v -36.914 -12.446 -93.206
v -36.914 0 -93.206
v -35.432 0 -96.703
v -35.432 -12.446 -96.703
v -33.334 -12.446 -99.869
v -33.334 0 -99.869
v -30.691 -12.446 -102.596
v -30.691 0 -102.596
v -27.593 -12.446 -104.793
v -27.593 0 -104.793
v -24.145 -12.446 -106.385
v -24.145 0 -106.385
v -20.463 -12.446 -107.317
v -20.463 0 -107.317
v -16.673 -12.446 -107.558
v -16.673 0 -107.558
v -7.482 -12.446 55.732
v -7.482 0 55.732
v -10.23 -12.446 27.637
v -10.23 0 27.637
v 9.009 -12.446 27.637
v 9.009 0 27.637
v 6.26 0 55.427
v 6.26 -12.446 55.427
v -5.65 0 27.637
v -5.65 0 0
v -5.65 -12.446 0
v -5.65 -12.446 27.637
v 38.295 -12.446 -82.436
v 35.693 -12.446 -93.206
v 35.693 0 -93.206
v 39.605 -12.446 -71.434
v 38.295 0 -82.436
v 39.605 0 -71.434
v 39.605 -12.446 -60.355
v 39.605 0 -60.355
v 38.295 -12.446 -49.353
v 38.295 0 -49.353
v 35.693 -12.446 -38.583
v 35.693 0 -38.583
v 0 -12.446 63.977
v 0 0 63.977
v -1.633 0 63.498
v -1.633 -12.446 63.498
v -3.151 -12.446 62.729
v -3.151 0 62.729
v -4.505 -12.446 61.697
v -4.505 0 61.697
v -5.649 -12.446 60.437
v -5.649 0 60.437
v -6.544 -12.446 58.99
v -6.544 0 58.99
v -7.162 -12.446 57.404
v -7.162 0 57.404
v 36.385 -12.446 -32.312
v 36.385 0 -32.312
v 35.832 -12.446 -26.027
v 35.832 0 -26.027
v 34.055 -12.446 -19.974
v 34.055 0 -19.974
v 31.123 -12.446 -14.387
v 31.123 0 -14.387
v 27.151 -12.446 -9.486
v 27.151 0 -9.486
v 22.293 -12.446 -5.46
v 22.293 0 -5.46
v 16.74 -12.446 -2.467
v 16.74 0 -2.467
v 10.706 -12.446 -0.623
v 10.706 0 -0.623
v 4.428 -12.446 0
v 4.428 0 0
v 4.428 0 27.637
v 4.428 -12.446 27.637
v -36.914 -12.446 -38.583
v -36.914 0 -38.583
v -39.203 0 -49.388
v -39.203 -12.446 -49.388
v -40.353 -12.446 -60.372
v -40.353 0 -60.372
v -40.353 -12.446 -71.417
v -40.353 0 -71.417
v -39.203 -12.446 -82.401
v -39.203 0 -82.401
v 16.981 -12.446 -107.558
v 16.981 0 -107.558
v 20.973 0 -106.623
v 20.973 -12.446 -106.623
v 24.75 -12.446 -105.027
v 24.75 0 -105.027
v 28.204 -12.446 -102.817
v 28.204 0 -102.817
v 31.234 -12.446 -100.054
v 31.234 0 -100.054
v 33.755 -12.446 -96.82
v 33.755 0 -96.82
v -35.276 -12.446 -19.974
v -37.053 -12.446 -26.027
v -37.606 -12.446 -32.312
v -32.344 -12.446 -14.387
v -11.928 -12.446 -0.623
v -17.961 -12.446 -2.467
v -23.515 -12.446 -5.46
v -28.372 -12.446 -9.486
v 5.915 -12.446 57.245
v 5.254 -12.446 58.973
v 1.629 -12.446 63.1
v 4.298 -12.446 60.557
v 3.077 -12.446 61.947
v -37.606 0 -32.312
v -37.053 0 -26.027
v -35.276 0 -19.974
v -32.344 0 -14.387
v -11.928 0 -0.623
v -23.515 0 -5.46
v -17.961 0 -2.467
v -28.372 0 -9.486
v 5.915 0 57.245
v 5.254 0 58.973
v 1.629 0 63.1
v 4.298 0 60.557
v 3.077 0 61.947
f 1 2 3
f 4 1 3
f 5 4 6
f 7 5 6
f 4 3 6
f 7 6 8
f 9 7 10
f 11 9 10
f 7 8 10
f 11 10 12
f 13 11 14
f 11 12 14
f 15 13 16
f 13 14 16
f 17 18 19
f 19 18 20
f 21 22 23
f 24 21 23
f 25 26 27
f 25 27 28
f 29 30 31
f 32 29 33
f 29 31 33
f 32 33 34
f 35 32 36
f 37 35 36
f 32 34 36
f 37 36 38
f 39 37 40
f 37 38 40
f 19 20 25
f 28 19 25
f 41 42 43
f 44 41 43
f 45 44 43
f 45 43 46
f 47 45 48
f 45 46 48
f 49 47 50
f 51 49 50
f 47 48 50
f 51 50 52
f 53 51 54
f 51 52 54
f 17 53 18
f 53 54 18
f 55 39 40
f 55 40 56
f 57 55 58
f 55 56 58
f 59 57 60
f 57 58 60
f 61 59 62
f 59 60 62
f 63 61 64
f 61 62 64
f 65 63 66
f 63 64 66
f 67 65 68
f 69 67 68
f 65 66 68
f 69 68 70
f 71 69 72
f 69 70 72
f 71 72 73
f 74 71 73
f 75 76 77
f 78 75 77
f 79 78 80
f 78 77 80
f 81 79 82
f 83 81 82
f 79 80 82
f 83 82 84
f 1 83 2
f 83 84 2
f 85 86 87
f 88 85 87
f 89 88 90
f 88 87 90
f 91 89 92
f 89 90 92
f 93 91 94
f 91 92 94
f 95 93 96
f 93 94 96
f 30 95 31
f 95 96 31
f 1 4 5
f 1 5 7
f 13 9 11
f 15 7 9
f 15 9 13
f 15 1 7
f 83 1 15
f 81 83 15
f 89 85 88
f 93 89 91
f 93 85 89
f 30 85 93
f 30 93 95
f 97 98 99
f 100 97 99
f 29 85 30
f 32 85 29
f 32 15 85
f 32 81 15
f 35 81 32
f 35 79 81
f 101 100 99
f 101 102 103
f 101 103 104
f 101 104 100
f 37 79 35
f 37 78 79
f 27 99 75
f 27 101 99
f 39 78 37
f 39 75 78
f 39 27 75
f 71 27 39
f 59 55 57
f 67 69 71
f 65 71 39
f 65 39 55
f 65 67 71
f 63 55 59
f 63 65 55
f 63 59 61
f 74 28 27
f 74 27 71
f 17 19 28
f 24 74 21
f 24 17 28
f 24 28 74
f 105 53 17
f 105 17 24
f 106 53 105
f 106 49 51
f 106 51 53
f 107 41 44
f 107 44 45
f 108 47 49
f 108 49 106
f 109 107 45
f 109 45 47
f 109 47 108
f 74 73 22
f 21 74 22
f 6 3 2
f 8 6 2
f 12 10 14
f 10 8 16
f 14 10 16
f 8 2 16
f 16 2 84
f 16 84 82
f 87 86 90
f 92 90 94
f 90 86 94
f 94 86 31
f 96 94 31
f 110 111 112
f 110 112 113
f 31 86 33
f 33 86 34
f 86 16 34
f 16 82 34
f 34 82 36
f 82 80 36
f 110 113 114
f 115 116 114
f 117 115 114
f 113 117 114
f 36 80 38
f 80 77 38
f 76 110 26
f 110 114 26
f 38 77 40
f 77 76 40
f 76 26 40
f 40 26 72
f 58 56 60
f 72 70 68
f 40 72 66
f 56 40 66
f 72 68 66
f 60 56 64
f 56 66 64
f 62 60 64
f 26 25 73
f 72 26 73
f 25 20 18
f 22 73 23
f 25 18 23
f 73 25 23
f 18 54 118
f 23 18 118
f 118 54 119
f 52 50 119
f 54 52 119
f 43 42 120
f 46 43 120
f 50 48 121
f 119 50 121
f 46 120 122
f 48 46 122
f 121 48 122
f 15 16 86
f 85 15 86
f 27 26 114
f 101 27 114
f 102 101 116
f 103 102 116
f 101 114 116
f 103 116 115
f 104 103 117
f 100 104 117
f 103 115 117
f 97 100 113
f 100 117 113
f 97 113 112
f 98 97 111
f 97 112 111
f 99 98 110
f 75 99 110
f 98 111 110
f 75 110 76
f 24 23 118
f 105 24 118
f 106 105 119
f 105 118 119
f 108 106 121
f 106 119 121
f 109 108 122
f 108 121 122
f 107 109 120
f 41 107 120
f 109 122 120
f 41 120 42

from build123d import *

# Parameters (mm, degrees)
F0_W     = 10.077599
F0_H     = 27.637042
F1_DEPTH = 12.446


with BuildPart() as f1:
    # F0 (on Front) → F1 (new body)
    with BuildSketch(Plane.XZ):
        with BuildLine():
            Line((-7.481851, 55.732161), (-10.230287, 27.637042))
            Line((-10.230287, 27.637042), (-5.649562, 27.637042))
            Line((-5.649562, 27.637042), (4.428037, 27.637042))
            Line((4.428037, 27.637042), (9.00876, 27.637042))
            Line((9.00876, 27.637042), (6.260325, 55.426773))
            ThreePointArc((6.260325, 55.426773), (4.298209, 60.557292), (0, 63.977458))
            ThreePointArc((0, 63.977458), (-5.105703, 61.09322), (-7.481851, 55.732161))
        make_face()
        with Locations((-0.610762, 13.818521)):
            Rectangle(F0_W, F0_H)
        with BuildLine():
            Line((4.428037, 0), (-5.649562, 0))
            ThreePointArc((-5.649562, 0), (-30.479653, -11.838325), (-36.914442, -38.58291))
            Line((-36.914442, -38.58291), (35.692916, -38.58291))
            ThreePointArc((35.692916, -38.58291), (29.258127, -11.838325), (4.428037, 0))
        make_face()
        with BuildLine():
            Line((35.692916, -38.58291), (-36.914442, -38.58291))
            ThreePointArc((-36.914442, -38.58291), (-40.497037, -65.894576), (-36.914442, -93.206242))
            ThreePointArc((-36.914442, -93.206242), (-29.192835, -103.766309), (-16.672513, -107.558377))
            Line((-16.672513, -107.558377), (16.980784, -107.558377))
            ThreePointArc((16.980784, -107.558377), (28.203918, -102.816569), (35.692916, -93.206242))
            ThreePointArc((35.692916, -93.206242), (39.7692, -65.894576), (35.692916, -38.58291))
        make_face()
    extrude(amount=F1_DEPTH)


solid = f1.part
